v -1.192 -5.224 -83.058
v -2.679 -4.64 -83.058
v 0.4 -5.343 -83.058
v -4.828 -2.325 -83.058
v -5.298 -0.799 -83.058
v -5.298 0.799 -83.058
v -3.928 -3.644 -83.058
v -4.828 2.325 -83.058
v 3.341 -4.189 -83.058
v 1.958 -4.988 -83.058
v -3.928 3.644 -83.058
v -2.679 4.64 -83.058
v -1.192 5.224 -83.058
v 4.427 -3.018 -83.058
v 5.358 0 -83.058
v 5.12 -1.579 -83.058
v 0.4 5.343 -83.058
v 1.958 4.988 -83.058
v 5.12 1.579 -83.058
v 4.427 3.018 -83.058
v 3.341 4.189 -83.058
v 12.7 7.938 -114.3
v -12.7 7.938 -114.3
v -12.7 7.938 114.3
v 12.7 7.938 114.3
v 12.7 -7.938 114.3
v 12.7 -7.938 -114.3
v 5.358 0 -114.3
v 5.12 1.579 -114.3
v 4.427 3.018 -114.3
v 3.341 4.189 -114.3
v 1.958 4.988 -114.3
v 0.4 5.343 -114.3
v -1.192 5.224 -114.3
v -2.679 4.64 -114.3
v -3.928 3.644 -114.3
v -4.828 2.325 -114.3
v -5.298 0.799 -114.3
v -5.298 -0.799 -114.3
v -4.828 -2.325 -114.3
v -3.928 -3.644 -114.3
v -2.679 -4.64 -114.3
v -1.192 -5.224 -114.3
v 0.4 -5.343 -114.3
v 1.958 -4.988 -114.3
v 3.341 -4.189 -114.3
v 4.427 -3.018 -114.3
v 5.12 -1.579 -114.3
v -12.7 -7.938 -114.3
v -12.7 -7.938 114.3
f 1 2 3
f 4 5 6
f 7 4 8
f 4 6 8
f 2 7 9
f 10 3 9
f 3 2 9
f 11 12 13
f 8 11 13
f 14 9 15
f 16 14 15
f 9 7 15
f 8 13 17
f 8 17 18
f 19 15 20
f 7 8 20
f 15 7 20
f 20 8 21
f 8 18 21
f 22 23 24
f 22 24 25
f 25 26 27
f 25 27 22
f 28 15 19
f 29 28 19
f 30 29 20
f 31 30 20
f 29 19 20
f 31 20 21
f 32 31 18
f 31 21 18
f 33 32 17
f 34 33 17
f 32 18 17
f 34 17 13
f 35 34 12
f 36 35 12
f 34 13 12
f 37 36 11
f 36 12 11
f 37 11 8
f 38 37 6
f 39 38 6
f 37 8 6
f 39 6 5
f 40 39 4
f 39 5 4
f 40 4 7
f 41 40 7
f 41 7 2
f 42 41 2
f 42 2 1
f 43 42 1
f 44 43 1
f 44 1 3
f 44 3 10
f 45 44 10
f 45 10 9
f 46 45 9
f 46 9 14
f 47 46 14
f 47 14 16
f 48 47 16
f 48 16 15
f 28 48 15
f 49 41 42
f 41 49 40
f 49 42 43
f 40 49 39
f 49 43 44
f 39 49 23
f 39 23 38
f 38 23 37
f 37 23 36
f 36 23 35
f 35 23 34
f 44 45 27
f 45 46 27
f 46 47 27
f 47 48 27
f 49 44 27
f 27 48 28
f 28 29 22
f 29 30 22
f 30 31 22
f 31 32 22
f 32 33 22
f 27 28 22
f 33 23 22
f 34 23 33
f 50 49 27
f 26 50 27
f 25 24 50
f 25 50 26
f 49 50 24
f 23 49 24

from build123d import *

# Parameters (mm, degrees)
SKETCH1_W                   = 25.4
SKETCH1_H                   = 15.875
BOSS_EXTRUDE1_DEPTH         = 114.3
F_1_2_13_TAPPED_HOLE1_D     = 10.71626
F_1_2_13_TAPPED_HOLE1_DEPTH = 31.242


with BuildPart() as part:
    # Sketch1 → Boss-Extrude1 (new body, symmetric)
    with BuildSketch(Plane.XY):
        Rectangle(SKETCH1_W, SKETCH1_H)
    extrude(amount=BOSS_EXTRUDE1_DEPTH, both=True)

    # 1/2-13 Tapped Hole1
    with Locations(Plane(origin=(0, 0, -114.3), x_dir=(-1, 0, 0), z_dir=(0, 0, -1))):
        with Locations((0, 0)):
            Hole(F_1_2_13_TAPPED_HOLE1_D / 2, depth=F_1_2_13_TAPPED_HOLE1_DEPTH)


solid = part.part
